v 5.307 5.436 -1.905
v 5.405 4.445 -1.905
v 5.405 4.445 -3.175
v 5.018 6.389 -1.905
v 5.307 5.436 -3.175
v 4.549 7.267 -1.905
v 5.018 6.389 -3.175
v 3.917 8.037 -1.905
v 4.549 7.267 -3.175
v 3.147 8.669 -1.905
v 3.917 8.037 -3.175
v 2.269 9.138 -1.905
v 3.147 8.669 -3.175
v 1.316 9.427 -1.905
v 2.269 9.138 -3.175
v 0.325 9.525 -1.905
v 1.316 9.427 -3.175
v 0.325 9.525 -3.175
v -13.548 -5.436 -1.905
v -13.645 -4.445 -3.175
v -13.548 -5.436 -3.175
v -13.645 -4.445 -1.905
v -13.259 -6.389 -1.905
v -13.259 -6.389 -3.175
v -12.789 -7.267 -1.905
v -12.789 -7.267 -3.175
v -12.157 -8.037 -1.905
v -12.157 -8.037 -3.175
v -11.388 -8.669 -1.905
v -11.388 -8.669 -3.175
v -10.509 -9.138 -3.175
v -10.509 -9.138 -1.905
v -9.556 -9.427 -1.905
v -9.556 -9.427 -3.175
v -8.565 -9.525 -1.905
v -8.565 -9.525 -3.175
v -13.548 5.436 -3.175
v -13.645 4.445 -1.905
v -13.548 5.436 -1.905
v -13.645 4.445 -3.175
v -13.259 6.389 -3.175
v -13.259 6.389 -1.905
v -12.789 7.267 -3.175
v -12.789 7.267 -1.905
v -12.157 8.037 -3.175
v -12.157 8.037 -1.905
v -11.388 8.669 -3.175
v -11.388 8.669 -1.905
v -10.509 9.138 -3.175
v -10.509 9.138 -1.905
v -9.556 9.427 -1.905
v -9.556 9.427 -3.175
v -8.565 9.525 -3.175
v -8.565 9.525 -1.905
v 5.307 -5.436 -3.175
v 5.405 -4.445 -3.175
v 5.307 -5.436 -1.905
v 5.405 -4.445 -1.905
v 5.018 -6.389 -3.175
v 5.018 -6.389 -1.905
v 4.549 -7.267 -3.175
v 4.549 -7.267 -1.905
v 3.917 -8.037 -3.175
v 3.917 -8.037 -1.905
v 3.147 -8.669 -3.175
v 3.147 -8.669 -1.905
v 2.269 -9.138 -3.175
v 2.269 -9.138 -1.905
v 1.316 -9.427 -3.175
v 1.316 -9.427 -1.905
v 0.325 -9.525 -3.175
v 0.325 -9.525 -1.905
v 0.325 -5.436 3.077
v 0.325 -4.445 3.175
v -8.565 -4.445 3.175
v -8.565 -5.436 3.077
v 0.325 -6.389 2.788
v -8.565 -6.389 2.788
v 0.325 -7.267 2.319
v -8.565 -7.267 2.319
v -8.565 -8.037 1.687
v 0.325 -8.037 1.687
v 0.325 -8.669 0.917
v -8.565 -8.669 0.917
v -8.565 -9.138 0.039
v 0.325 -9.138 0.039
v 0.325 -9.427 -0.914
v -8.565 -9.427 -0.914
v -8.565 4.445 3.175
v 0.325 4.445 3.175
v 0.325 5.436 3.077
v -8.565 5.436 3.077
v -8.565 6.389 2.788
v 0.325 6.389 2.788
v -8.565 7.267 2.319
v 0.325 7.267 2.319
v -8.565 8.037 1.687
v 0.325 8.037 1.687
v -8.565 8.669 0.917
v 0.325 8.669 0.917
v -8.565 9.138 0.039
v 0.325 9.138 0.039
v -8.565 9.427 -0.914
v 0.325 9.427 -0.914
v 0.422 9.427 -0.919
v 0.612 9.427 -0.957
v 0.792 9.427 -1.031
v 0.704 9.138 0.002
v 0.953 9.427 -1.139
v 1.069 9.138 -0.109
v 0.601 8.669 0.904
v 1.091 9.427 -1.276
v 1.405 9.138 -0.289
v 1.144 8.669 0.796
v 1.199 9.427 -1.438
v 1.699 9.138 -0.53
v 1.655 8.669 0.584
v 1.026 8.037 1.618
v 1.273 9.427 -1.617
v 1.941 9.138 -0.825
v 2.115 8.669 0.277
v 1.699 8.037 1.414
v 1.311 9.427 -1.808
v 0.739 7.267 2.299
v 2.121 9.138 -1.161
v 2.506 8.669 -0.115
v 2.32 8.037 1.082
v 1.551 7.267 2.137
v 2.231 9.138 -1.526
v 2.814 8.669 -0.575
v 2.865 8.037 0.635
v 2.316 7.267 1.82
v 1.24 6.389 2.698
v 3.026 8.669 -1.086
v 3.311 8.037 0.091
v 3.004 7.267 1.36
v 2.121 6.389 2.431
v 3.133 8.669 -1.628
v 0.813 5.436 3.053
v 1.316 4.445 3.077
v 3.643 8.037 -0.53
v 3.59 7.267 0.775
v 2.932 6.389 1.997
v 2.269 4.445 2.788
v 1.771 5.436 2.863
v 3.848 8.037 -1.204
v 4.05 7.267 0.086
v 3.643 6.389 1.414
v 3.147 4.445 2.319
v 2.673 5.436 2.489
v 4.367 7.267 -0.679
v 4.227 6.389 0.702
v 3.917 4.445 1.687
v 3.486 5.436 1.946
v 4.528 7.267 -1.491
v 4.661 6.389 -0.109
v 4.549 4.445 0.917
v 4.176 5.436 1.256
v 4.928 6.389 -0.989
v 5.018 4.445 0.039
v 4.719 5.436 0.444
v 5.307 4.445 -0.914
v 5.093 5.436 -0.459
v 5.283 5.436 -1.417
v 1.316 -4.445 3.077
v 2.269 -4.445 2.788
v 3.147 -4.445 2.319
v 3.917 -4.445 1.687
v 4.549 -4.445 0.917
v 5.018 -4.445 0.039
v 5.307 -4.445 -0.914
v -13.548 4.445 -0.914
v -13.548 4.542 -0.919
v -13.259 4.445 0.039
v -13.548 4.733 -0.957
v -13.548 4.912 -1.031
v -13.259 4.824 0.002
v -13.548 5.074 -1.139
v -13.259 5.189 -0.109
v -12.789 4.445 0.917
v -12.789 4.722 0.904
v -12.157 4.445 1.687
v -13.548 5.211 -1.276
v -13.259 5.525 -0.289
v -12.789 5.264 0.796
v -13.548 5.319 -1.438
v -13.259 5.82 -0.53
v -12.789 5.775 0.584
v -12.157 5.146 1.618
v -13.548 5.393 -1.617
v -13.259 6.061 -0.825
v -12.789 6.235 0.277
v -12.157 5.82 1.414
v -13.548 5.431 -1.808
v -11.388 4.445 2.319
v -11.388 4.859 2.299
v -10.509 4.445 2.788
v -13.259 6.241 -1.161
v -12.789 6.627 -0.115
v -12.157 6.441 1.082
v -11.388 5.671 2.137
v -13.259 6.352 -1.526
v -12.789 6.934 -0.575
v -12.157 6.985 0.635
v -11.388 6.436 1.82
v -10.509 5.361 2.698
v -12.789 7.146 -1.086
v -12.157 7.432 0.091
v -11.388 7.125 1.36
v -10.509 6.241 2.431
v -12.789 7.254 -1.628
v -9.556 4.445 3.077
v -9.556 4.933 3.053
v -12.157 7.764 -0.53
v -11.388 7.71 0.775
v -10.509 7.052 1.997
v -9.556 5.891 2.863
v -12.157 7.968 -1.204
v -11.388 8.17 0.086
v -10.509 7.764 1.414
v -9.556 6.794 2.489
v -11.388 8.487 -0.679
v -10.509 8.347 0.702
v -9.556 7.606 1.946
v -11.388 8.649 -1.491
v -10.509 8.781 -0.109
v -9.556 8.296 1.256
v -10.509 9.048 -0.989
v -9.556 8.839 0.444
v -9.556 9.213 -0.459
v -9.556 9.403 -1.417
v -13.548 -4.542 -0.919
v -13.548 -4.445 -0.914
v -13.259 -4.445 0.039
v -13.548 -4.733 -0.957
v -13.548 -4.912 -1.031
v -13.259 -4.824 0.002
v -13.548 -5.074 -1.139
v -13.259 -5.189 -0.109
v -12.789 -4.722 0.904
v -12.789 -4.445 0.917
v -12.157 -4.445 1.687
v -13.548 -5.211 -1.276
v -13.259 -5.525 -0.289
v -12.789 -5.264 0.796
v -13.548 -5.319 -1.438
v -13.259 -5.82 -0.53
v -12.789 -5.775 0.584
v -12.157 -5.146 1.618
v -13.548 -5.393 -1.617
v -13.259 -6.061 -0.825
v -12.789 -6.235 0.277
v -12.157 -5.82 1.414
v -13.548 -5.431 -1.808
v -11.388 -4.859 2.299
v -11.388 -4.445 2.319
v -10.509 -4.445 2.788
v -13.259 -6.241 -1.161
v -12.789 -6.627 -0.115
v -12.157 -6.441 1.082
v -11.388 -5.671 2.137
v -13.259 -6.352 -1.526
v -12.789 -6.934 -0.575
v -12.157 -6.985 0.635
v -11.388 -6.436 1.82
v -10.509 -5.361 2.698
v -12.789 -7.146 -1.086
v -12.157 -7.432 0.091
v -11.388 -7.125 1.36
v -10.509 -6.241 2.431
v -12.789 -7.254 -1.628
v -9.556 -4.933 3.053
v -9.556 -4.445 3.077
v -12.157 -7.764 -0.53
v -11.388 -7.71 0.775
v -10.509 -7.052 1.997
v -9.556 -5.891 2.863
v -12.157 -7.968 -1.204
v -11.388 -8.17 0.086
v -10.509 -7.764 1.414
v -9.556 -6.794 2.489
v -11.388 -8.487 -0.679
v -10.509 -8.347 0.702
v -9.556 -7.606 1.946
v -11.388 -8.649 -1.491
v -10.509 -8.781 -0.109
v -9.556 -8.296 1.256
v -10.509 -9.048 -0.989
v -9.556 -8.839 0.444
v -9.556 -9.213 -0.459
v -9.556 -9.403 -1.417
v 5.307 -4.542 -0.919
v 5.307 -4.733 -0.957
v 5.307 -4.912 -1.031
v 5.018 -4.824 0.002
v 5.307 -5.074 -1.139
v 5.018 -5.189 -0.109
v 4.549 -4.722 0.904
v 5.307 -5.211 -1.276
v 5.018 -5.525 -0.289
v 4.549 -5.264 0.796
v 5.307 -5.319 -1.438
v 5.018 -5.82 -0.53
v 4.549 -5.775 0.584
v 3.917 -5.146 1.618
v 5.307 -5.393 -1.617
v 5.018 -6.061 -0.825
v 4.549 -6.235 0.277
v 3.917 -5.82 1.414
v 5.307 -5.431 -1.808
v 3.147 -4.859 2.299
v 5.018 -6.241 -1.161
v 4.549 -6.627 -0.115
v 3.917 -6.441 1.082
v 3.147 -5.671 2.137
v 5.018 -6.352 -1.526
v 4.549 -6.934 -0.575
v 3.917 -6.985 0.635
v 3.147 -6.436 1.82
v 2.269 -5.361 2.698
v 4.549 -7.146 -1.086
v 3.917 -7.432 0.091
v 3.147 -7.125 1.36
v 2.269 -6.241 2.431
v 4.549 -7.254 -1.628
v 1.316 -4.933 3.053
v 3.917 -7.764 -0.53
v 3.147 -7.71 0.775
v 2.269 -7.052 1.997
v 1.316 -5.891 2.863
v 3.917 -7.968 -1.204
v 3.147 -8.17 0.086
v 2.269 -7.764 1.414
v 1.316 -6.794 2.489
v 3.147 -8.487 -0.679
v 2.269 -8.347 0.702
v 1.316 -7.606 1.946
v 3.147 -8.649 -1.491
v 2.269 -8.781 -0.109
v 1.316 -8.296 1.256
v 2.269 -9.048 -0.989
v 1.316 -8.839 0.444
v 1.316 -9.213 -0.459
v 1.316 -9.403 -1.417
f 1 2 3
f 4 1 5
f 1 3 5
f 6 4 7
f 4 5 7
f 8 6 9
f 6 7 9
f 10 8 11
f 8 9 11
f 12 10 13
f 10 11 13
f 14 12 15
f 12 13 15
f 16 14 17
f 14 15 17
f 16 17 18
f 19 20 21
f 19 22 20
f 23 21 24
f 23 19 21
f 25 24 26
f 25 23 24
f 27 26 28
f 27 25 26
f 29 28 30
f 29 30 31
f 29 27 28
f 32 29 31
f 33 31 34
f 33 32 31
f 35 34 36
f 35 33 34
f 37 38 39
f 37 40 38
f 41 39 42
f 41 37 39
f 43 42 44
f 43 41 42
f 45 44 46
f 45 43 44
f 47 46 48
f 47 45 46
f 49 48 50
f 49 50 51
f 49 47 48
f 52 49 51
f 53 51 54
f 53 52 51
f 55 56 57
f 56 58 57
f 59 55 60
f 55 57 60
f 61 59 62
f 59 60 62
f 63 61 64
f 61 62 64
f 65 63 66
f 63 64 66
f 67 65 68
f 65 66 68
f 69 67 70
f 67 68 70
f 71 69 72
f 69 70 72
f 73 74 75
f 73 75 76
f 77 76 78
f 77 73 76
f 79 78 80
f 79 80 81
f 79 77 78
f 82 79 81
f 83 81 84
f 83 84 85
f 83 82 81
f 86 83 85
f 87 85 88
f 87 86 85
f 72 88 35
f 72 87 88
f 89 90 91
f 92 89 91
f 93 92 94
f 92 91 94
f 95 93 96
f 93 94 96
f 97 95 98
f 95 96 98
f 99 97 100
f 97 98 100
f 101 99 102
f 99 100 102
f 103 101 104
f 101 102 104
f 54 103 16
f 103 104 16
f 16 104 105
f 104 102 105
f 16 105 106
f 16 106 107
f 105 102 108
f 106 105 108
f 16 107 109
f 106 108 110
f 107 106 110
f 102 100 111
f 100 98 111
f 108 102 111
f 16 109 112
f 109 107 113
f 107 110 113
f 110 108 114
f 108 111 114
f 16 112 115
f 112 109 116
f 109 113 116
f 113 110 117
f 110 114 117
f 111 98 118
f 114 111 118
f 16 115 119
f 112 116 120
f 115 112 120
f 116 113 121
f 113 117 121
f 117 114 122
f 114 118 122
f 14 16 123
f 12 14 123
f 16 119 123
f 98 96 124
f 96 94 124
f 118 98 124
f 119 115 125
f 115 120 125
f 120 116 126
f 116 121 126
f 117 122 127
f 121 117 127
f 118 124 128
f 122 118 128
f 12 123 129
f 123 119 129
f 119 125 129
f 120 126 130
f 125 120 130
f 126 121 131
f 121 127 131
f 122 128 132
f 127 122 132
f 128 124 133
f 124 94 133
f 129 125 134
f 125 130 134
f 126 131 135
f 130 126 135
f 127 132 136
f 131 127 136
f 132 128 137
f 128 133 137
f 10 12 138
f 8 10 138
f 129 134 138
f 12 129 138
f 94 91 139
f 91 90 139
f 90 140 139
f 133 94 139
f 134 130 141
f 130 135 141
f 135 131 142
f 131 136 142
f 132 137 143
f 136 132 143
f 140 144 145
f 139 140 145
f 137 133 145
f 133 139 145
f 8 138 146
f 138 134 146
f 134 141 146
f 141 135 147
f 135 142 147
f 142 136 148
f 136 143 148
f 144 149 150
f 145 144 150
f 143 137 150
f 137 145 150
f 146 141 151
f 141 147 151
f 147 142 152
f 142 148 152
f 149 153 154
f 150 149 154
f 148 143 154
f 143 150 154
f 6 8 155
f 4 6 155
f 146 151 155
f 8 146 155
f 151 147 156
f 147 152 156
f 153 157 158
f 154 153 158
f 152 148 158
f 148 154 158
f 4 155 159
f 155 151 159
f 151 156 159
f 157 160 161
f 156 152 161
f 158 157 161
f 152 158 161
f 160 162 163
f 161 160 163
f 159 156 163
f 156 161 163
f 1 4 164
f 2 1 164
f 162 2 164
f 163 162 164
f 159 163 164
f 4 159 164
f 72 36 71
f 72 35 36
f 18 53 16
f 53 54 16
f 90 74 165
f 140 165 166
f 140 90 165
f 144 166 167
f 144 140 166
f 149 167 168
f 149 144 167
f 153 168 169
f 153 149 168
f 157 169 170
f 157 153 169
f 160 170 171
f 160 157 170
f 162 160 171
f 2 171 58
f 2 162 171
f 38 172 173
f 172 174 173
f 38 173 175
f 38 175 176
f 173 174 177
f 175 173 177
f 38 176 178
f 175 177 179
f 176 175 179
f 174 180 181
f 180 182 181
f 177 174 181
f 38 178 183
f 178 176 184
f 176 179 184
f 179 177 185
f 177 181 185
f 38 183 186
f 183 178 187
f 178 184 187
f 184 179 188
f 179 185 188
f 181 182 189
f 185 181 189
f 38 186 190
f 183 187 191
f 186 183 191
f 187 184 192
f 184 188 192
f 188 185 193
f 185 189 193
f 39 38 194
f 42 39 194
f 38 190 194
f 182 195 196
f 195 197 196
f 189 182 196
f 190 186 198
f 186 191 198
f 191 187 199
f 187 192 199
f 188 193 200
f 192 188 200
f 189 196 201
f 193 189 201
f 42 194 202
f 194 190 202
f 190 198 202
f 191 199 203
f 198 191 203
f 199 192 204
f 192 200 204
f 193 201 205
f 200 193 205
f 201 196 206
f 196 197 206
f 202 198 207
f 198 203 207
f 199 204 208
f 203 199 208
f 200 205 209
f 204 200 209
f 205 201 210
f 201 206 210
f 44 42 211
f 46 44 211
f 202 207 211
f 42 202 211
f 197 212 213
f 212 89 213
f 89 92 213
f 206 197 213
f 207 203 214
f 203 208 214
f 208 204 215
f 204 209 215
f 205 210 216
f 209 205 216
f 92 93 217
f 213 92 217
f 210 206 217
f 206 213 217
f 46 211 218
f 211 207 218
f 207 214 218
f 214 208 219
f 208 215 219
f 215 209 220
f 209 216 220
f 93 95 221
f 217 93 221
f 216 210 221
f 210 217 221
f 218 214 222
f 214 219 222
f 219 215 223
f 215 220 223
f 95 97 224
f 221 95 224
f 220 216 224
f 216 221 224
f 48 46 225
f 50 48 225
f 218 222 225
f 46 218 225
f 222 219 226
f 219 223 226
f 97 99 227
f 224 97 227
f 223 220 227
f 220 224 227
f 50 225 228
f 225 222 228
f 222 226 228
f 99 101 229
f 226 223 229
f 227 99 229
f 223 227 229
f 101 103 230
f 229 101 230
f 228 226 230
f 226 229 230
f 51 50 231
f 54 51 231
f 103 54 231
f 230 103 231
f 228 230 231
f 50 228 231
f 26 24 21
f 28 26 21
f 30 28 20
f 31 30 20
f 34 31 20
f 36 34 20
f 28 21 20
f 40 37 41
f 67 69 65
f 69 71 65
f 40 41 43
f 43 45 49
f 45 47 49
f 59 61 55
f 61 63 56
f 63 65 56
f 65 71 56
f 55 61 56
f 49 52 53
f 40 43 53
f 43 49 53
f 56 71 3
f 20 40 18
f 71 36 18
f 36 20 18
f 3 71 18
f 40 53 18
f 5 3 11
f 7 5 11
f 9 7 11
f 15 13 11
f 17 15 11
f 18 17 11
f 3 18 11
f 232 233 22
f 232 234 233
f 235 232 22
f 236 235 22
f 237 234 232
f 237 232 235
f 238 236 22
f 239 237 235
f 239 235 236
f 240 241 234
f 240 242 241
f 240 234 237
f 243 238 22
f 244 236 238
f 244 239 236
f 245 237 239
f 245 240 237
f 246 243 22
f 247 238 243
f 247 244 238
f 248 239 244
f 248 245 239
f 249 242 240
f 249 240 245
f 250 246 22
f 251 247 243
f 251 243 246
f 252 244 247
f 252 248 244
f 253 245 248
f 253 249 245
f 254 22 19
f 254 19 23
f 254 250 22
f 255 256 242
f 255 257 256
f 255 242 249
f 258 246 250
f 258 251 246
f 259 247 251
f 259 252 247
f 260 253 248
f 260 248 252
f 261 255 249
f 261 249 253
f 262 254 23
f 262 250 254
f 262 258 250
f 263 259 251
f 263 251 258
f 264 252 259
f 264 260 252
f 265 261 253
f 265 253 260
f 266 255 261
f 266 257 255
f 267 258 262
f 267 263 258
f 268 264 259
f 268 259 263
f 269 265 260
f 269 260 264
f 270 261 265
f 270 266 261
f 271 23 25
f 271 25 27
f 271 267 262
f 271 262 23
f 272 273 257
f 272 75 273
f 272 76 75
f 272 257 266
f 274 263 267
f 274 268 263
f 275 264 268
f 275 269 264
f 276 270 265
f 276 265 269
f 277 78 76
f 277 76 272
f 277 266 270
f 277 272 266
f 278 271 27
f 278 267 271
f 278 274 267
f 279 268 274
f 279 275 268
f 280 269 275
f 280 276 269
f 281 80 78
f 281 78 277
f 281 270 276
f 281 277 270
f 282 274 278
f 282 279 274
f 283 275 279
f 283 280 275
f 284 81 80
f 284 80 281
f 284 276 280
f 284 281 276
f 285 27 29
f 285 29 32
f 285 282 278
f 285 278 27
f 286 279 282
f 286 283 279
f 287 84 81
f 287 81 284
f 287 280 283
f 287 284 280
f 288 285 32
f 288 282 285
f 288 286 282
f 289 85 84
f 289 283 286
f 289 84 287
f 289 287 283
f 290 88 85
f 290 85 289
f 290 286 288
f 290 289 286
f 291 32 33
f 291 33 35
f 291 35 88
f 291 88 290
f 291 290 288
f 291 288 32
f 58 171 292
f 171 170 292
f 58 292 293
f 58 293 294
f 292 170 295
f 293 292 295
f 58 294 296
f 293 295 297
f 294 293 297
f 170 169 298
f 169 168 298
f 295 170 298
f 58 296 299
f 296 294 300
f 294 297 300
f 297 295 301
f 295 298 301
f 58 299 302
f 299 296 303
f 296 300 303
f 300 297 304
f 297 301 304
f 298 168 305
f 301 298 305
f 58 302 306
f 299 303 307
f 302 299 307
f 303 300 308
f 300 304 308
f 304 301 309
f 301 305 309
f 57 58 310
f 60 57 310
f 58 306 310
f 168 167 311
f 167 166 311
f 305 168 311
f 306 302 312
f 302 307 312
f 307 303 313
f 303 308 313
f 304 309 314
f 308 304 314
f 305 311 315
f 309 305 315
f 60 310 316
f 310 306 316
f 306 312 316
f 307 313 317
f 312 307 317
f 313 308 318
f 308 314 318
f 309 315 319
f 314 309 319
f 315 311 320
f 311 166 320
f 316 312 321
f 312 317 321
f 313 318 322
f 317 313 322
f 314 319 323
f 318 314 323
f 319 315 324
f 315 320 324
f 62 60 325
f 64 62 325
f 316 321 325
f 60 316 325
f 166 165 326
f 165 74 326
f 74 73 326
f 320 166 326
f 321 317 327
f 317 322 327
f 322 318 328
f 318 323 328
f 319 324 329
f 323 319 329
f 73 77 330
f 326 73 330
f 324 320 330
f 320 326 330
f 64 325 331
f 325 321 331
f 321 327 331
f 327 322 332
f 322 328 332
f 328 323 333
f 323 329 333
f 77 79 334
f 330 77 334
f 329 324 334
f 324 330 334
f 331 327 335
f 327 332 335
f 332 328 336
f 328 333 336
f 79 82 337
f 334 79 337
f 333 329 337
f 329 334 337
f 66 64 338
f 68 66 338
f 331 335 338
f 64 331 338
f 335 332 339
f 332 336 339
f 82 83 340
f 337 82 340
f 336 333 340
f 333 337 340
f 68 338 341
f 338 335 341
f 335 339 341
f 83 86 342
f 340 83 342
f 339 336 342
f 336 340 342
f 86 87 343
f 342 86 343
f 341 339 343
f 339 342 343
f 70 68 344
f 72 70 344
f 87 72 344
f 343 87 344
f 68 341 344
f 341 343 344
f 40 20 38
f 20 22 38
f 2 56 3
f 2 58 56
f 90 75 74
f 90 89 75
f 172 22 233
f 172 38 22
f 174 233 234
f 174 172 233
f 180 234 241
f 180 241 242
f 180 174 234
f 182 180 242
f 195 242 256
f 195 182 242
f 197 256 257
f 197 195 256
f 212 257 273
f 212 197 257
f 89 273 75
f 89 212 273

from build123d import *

# Parameters (mm, degrees)
F0_W     = 19.05
F0_H     = 19.05
F1_DEPTH = 3.175
F2_R     = 5.08


with BuildPart() as f1:
    # F0 (on Top) → F1 (new body, symmetric)
    with BuildSketch(Plane.XY):
        with Locations((-4.120239, 0)):
            Rectangle(F0_W, F0_H)
    extrude(amount=F1_DEPTH, both=True)

    # F2
    f2_edges = [f1.edges().sort_by_distance(p)[0] for p in [
        (-4.120239, -9.525, 3.175),
        (5.404761, 0, 3.175),
        (-4.120239, 9.525, 3.175),
        (-13.645239, 0, 3.175),
        (5.404761, -9.525, 0),
        (-13.645239, -9.525, 0),
        (-13.645239, 9.525, 0),
        (5.404761, 9.525, 0),
    ]]
    fillet(f2_edges, radius=F2_R)


solid = f1.part
